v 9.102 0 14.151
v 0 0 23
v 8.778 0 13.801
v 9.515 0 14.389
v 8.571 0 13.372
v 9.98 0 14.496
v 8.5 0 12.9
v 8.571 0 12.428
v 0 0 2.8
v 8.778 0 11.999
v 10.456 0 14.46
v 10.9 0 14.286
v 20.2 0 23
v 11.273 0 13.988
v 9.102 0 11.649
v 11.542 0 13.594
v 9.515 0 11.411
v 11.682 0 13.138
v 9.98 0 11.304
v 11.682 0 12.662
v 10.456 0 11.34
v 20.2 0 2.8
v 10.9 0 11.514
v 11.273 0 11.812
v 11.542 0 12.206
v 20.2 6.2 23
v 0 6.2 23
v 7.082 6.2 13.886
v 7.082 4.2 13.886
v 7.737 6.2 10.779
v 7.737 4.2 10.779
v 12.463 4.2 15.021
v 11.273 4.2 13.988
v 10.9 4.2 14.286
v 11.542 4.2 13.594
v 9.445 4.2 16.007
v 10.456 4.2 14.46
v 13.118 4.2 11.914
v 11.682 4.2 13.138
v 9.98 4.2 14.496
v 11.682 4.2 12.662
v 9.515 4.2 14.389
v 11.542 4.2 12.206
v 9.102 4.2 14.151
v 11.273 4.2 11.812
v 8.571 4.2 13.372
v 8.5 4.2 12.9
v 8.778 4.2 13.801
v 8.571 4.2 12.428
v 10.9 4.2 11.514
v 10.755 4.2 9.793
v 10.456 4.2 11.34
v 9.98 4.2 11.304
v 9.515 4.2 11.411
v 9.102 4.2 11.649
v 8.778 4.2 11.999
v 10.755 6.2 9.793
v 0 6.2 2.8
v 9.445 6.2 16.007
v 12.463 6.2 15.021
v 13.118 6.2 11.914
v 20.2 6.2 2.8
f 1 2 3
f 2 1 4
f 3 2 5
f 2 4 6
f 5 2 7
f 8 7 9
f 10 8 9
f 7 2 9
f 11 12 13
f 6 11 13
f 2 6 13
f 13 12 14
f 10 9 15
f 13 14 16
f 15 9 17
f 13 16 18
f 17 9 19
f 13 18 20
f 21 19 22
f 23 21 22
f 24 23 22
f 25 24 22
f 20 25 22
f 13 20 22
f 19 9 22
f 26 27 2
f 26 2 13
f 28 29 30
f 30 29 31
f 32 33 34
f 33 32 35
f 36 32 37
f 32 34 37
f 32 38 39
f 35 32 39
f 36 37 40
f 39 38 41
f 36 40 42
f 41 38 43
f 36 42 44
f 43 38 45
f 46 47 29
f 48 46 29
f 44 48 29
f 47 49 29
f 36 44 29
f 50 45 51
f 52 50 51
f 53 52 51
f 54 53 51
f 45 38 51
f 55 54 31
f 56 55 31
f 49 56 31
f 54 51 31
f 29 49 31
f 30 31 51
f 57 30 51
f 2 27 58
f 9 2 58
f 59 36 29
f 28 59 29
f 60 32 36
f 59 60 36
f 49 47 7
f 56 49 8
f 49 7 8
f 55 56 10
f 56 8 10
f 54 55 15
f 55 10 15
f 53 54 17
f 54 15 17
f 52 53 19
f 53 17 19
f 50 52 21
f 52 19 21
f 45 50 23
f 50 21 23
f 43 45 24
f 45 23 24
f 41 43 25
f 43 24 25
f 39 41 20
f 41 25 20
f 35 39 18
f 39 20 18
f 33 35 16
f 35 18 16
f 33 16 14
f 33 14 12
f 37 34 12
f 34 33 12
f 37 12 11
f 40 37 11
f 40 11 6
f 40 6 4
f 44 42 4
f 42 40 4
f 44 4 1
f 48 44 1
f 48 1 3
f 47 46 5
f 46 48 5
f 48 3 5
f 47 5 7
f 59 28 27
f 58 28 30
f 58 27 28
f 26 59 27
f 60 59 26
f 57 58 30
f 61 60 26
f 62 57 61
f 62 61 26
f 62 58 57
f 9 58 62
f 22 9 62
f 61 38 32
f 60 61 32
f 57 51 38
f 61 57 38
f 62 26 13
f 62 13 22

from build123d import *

# Parameters (mm, degrees)
SKETCH1_W                  = 20.2
SKETCH1_H                  = 20.2
BOSS_EXTRUDE1_DEPTH        = 6.2
F_3_2_3_2_DIAMETER_HOLE1_D = 3.2
CUT_EXTRUDE1_START         = -2
SKETCH4_R                  = 1.6
CUT_EXTRUDE1_DEPTH         = 2


with BuildPart() as part:
    # Sketch1 → Boss-Extrude1 (new body)
    with BuildSketch(Plane(origin=(0, 6.2, 0), x_dir=(1, 0, 0), z_dir=(0, 1, 0))):
        with Locations((10.1, -12.9)):
            Rectangle(SKETCH1_W, SKETCH1_H)
    extrude(amount=-BOSS_EXTRUDE1_DEPTH)

    # Ø3.2 (3.2) Diameter Hole1 (through all)
    with Locations(Plane(origin=(0, 6.2, 0), x_dir=(1, 0, 0), z_dir=(0, 1, 0))):
        with Locations((10.1, -12.9)):
            Hole(F_3_2_3_2_DIAMETER_HOLE1_D / 2)

    # Sketch4 → Cut-Extrude1 (cut)
    with BuildSketch(Plane(origin=(0, 6.2, 0), x_dir=(1, 0, 0), z_dir=(0, 1, 0)).offset(CUT_EXTRUDE1_START)):
        Polygon((7.73670062, -10.779115898), (10.75508982, -9.792880649), (13.118389201, -11.913764751), (12.46329938, -15.020884102), (9.44491018, -16.007119351), (7.081610799, -13.886235249), align=None)
        with Locations(Location((10.1, -12.9, 0), (0, 0, 270))):
            Circle(SKETCH4_R, mode=Mode.SUBTRACT)
    extrude(amount=CUT_EXTRUDE1_DEPTH, mode=Mode.SUBTRACT)


solid = part.part
